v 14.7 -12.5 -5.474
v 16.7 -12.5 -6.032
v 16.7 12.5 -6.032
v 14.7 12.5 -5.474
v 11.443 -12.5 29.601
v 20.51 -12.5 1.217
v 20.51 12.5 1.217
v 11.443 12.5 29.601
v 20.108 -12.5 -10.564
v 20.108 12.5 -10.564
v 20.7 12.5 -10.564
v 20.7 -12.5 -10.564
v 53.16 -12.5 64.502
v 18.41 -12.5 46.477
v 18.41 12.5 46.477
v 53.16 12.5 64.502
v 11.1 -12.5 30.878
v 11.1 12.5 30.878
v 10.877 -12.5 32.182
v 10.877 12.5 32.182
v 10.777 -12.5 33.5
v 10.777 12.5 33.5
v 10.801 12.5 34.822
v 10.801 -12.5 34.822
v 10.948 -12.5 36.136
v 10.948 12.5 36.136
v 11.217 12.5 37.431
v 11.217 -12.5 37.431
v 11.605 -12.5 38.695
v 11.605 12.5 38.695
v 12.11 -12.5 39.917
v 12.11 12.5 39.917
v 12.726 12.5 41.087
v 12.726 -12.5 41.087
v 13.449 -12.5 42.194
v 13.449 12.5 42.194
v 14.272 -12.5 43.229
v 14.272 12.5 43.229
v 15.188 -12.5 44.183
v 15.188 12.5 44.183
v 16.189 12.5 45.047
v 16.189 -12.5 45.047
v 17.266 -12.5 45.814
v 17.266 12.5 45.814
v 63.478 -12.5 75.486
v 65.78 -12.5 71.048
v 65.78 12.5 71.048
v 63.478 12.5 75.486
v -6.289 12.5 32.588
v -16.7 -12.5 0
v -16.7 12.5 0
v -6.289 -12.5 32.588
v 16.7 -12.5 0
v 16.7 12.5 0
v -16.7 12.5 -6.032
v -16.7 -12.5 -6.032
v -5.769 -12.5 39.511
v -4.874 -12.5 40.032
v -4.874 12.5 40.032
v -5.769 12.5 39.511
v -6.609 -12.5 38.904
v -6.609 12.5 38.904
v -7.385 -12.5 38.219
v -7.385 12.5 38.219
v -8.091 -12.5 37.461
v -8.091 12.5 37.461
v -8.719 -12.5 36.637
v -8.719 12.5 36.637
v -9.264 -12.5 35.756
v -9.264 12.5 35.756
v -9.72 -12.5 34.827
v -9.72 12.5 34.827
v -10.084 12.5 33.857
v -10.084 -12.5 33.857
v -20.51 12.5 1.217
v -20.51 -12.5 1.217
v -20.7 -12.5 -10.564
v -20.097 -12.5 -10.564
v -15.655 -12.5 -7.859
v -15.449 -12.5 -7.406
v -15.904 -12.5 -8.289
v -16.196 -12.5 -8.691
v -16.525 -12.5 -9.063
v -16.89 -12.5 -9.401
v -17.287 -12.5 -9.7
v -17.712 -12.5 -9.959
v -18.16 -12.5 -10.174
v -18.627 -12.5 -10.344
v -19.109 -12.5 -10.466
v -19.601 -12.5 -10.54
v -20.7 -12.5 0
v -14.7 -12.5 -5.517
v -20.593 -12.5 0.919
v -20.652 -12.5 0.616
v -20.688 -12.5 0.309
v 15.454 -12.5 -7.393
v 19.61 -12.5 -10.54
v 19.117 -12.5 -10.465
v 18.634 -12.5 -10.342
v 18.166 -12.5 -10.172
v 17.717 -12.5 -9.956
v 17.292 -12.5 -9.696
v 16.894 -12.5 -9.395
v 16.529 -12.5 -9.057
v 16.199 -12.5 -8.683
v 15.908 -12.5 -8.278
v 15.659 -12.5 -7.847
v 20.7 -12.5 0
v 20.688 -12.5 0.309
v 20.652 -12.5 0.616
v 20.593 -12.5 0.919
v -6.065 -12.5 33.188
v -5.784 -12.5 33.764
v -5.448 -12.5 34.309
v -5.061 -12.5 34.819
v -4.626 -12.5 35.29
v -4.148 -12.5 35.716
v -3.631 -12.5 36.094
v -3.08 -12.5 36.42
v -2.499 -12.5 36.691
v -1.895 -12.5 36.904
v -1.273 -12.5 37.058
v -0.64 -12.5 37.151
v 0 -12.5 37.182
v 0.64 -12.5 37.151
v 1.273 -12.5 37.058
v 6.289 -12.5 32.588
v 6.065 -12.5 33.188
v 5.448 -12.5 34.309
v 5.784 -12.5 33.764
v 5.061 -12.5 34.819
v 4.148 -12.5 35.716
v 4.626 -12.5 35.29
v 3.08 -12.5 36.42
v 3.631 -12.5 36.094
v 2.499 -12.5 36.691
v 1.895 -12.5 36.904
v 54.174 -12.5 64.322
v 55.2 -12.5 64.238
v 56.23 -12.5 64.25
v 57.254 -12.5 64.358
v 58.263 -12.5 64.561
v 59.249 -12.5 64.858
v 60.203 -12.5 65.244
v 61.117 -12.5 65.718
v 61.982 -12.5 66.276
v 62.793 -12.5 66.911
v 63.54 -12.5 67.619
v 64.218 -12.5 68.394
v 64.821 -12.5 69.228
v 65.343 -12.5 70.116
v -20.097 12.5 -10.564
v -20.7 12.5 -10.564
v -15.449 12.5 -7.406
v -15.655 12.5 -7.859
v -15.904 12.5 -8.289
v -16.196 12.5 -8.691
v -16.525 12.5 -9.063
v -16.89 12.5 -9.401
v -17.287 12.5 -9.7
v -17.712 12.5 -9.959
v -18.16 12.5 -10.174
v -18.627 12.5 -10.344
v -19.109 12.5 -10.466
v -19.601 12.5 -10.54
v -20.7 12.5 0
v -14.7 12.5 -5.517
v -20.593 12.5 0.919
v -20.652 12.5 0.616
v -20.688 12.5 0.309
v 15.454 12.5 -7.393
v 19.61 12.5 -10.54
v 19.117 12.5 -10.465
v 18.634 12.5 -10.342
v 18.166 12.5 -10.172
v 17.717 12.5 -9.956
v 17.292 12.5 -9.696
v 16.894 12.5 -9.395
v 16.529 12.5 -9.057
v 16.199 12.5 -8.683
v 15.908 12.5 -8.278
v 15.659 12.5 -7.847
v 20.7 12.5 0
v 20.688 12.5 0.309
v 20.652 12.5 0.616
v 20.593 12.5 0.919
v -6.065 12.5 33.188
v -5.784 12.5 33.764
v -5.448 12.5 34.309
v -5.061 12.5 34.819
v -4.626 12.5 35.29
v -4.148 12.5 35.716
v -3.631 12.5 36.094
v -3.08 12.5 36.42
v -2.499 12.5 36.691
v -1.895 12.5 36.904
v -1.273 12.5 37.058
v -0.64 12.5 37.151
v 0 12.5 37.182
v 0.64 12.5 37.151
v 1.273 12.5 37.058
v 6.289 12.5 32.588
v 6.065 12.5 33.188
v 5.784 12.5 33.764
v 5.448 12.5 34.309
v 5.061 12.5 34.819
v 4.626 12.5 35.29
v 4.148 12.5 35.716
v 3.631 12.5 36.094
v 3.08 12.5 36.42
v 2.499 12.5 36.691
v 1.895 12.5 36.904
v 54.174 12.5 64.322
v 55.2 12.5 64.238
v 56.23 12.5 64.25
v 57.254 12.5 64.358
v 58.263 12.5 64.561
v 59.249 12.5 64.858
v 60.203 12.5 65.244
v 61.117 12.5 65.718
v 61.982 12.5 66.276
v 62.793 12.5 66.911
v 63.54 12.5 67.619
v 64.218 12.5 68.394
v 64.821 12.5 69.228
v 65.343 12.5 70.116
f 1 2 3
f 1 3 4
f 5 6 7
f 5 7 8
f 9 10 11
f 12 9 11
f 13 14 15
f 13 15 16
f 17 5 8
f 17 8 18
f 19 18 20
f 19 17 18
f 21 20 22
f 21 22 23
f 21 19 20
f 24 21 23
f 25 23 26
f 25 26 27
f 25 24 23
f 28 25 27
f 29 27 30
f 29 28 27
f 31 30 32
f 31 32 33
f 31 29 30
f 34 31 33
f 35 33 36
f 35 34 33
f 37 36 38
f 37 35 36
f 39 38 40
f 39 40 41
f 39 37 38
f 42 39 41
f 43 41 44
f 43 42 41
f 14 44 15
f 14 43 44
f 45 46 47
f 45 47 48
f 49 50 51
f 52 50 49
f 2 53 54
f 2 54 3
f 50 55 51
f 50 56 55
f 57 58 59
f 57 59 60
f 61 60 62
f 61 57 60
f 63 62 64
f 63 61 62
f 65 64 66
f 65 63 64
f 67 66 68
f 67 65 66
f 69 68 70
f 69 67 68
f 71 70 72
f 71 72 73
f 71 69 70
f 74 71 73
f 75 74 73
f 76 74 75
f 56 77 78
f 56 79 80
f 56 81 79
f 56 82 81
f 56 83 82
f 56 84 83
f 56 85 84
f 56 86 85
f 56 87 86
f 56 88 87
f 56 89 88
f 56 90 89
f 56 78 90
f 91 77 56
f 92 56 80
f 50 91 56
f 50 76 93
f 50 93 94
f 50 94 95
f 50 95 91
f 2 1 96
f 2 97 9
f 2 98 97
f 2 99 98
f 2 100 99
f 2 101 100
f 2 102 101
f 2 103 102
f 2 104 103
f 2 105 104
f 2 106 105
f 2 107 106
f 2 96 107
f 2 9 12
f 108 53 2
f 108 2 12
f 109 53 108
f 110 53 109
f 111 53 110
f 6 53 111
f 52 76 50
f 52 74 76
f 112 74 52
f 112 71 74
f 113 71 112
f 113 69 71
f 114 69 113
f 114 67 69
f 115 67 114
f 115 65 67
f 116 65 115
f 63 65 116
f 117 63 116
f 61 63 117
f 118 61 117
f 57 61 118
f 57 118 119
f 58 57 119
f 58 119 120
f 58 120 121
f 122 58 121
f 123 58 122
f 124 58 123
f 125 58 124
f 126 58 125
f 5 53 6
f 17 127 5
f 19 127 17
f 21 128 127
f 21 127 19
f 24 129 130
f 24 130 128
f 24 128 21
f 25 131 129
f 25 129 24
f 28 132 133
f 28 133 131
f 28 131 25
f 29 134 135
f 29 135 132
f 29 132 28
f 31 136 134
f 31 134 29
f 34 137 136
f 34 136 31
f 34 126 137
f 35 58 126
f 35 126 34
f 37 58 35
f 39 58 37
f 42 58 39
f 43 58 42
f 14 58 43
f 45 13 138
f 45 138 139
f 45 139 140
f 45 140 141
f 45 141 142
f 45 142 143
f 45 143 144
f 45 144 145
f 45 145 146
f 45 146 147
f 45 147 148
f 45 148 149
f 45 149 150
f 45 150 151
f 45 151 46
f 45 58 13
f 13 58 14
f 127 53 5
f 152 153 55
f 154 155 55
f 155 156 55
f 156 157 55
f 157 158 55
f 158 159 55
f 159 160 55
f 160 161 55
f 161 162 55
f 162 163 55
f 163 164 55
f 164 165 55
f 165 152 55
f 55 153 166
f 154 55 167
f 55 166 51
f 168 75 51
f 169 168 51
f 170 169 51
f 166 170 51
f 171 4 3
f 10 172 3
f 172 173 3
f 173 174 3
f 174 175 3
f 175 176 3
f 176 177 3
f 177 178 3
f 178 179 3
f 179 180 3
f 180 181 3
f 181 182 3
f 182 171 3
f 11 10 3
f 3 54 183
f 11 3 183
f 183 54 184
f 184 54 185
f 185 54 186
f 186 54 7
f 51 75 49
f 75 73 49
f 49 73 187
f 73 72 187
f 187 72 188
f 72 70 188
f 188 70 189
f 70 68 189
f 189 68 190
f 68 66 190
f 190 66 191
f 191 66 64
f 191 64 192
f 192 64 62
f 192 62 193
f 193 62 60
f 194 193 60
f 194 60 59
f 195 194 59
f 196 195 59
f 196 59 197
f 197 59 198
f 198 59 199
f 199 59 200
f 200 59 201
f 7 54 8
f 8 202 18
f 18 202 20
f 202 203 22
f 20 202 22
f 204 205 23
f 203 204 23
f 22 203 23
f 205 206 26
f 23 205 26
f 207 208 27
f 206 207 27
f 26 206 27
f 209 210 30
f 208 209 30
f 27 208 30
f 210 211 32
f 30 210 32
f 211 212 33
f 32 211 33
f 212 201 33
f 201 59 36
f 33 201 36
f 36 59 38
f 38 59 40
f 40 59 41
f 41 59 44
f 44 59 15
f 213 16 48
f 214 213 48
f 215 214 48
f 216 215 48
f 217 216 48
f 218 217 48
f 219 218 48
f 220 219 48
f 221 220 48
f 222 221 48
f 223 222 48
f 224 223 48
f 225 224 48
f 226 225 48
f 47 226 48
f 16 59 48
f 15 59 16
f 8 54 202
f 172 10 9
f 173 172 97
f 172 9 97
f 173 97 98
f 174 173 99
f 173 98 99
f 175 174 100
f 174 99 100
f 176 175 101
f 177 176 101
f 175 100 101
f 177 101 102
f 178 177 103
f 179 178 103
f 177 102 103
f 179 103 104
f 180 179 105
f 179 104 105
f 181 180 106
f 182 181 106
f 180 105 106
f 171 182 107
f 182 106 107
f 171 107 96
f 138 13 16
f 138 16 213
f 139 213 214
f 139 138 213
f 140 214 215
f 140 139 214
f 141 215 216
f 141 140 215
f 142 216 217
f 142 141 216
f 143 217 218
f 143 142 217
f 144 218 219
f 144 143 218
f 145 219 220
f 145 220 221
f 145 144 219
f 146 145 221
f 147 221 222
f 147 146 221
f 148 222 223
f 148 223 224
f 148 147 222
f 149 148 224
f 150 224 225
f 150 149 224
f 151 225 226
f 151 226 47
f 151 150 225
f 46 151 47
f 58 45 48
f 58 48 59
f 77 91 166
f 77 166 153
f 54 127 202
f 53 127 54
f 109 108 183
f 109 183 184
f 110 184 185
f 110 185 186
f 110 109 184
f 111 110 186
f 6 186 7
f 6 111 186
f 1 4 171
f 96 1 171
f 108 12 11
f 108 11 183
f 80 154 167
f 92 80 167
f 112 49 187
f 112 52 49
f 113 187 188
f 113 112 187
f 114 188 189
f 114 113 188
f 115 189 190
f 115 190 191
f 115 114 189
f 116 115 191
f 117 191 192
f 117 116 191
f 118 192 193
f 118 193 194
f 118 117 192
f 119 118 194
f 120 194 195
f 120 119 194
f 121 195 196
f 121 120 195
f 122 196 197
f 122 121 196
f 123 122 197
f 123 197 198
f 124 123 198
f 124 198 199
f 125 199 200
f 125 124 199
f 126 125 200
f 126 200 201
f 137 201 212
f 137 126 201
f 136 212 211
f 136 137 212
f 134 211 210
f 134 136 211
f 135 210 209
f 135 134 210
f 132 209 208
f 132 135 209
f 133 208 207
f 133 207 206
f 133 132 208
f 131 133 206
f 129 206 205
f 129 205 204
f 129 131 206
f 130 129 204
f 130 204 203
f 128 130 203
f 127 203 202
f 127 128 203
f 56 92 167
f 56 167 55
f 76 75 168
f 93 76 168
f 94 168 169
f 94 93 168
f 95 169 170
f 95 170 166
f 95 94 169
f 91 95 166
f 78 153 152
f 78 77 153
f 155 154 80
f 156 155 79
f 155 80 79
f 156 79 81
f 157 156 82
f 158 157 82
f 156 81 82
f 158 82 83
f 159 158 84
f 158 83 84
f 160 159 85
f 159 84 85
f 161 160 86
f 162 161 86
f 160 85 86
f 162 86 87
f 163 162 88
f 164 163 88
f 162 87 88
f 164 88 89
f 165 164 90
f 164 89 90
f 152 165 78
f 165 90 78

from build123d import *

# Parameters (mm, degrees)
F1_DEPTH = 12.5
F2_R     = 5


# Not quite as in the source:
# - a feature names something its author has since deleted; it is built from what else it names


with BuildPart() as f1:
    # F0 (on Front) → F1 (new body, symmetric)
    with BuildSketch(Plane.XZ):
        with BuildLine():
            ThreePointArc((-6.2894771713, 32.5883566917), (0, 37.1817581393), (6.2894771713, 32.5883566917))
            Line((6.2894771713, 32.5883566917), (16.7, 0))
            Line((16.7, 0), (20.7, 0))
            ThreePointArc((20.7, 0), (20.6522901201, 0.6159568218), (20.5102985969, 1.2172200305))
            Line((20.5102985969, 1.2172200305), (11.4429113124, 29.6011211997))
            ThreePointArc((11.4429113124, 29.6011211997), (11.8429318518, 39.3121369153), (18.4103098825, 46.4768691826))
            Line((18.4103098825, 46.4768691826), (53.1603869456, 64.5016425675))
            Line((53.1603869456, 64.5016425675), (65.7802901999, 71.0475531243))
            Line((65.7802901999, 71.0475531243), (63.4780788017, 75.4860013529))
            Line((63.4780788017, 75.4860013529), (-4.8740239191, 40.0319458213))
            ThreePointArc((-4.8740239191, 40.0319458213), (-8.0911004209, 37.4607846039), (-10.0835041229, 33.8565123177))
            Line((-10.0835041229, 33.8565123177), (-20.5102985969, 1.2172200305))
            ThreePointArc((-20.5102985969, 1.2172200305), (-20.6522901201, 0.6159568218), (-20.7, 0))
            Line((-20.7, 0), (-16.7, 0))
            Line((-16.7, 0), (-6.2894771713, 32.5883566917))
        make_face()
        Polygon((-16.7, -5.2822484933), (-16.7, 0), (-20.7, 0), (-20.7, -10.5644969866), (-16.7, -10.5644969866), (-16.7, -6.0322484933), align=None)
        Polygon((20.7, 0), (16.7, 0), (16.7, -5.2822484933), (16.7, -6.0322484933), (16.7, -10.5644969866), (20.7, -10.5644969866), align=None)
        with BuildLine():
            Line((65.7802901999, 71.0475531243), (53.1603869456, 64.5016425675))
            ThreePointArc((53.1603869456, 64.5016425675), (60.6653765198, 65.4706764668), (65.7802901999, 71.0475531243))
        make_face()
        Polygon((-14.7, -5.5168885775), (-16.7, -6.0322484933), (-16.7, -10.5644969866), align=None)
        Polygon((16.7, -10.5644969866), (16.7, -6.0322484933), (14.7, -5.4739810377), align=None)
    extrude(amount=F1_DEPTH, both=True)

    # F2
    f2_edges = [f1.edges().sort_by_distance(p)[0] for p in [
        (16.7, 0, -10.564497),
        (-16.7, 0, -10.564497),
    ]]
    fillet(f2_edges, radius=F2_R)


solid = f1.part
